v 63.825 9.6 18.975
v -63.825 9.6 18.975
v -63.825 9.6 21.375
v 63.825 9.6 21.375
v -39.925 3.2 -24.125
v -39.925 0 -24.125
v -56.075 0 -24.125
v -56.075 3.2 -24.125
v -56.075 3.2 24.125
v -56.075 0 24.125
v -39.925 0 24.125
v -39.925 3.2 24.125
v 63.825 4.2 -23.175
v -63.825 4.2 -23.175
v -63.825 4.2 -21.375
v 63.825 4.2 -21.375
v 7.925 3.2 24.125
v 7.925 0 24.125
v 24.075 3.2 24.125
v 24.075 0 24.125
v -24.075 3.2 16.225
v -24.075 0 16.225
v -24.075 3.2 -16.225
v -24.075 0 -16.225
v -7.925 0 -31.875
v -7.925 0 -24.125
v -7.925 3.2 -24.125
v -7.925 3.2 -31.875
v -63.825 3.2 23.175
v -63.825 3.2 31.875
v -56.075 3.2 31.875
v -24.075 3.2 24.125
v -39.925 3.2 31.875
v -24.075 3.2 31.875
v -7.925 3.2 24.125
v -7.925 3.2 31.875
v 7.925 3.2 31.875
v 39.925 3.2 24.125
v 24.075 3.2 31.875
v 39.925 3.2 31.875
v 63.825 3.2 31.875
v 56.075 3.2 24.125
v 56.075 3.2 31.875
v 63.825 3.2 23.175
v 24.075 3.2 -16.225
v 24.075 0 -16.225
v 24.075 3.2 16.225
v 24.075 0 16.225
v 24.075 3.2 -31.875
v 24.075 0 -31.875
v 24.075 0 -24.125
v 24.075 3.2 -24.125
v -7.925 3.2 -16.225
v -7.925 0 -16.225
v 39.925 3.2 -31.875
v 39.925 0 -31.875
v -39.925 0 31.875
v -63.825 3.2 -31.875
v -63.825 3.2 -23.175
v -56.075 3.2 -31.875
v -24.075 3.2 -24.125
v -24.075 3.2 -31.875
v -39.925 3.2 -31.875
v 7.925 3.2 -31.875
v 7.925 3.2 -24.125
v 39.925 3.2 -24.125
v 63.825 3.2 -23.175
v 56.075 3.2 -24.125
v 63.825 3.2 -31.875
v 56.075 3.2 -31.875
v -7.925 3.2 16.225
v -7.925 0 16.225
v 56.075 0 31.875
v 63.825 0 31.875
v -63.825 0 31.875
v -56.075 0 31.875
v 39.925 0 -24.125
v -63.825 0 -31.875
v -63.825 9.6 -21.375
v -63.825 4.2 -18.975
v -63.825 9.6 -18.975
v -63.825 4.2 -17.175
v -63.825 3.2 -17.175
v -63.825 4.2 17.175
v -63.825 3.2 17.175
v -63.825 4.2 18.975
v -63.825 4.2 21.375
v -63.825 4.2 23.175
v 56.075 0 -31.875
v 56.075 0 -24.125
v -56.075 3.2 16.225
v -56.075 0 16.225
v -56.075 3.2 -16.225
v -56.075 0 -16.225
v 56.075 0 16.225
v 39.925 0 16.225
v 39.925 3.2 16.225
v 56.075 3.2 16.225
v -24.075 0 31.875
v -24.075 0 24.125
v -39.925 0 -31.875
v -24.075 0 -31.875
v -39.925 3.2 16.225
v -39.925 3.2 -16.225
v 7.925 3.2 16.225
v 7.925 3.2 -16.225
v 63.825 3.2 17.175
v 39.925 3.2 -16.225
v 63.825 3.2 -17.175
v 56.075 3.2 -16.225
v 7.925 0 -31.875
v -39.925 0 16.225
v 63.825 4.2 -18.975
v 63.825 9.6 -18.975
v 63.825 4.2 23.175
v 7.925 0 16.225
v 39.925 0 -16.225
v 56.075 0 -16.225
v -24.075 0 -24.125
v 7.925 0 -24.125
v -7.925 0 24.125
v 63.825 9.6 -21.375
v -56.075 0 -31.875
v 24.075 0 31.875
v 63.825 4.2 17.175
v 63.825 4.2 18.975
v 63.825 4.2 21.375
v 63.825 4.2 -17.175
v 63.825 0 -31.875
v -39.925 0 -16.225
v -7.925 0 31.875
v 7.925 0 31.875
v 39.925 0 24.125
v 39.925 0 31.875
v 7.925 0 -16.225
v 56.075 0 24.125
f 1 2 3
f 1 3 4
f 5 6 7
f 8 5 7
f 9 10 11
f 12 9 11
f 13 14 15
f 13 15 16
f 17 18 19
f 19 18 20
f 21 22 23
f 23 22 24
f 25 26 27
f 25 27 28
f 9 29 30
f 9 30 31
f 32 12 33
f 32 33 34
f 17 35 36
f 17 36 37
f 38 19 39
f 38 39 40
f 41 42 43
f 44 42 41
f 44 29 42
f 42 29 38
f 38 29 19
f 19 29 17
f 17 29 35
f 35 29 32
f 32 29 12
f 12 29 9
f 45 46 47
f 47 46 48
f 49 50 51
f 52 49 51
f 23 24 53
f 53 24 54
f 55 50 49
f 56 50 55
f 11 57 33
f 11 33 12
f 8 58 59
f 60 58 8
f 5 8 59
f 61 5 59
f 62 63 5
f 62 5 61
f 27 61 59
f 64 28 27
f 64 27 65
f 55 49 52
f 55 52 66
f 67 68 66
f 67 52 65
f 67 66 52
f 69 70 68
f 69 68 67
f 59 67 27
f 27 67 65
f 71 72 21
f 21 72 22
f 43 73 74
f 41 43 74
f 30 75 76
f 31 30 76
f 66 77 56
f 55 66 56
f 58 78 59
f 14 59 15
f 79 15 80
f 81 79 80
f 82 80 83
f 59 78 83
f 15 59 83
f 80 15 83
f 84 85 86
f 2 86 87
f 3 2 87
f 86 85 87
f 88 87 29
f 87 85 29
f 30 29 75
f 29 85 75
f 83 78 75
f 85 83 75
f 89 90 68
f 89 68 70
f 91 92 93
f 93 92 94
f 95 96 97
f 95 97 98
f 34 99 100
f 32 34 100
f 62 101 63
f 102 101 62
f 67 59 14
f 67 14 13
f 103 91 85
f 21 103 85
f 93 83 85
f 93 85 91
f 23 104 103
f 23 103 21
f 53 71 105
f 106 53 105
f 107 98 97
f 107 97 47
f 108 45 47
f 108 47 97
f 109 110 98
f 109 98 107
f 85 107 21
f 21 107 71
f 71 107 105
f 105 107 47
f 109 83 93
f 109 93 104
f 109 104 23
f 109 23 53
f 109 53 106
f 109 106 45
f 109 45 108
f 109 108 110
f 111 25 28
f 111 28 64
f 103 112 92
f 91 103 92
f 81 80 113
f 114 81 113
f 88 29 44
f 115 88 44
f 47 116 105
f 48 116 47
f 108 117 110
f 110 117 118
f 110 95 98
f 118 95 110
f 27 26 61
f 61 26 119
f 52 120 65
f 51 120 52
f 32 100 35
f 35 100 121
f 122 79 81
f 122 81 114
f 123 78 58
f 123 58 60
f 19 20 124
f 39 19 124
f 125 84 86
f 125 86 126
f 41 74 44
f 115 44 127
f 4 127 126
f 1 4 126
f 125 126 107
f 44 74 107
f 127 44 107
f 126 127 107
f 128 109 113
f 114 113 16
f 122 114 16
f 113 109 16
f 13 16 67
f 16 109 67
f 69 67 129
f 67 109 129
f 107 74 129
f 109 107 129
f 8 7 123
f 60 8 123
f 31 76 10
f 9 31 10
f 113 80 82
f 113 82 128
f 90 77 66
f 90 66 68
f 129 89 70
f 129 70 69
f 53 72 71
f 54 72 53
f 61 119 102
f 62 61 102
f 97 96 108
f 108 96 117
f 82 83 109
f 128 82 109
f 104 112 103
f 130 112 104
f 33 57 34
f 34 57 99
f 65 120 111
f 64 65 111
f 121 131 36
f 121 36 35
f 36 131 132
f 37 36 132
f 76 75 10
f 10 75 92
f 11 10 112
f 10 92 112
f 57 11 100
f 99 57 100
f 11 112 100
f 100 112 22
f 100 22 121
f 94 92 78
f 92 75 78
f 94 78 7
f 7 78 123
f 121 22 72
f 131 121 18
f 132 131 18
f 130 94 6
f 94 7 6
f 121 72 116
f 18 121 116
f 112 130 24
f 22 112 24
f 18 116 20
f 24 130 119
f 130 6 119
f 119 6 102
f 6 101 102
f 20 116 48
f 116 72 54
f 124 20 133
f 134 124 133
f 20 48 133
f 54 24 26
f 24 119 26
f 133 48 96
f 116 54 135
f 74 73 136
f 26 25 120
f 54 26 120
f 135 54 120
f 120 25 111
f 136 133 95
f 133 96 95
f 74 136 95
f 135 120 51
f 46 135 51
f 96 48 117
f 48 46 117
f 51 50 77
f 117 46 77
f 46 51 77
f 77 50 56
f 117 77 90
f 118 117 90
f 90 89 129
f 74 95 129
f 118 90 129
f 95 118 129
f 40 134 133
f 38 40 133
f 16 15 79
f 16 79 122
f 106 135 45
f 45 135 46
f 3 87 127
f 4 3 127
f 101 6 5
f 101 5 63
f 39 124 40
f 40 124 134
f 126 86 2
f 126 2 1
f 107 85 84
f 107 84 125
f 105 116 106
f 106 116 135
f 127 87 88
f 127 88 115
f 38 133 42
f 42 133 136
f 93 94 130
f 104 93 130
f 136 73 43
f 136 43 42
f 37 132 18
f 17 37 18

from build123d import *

# Parameters (mm, degrees)
SKETCH1_W           = 7.75
SKETCH1_H           = 32.45
SKETCH1_H_2         = 7.9
SKETCH1_H_3         = 7.75
SKETCH1_W_2         = 16.15
SKETCH1_W_3         = 15.85
BOSS_EXTRUDE1_DEPTH = 3.2
SKETCH2_W           = 127.65
SKETCH2_H           = 6
BOSS_EXTRUDE2_DEPTH = 1
SKETCH3_W           = 127.65
SKETCH3_H           = 2.4
BOSS_EXTRUDE3_DEPTH = 5.4


with BuildPart() as part:
    # Sketch1 → Boss-Extrude1 (new body)
    with BuildSketch(Plane(origin=(0, 0, 0), x_dir=(1, 0, 0), z_dir=(0, 1, 0))):
        with Locations((-59.95, 0)):
            Rectangle(SKETCH1_W, SKETCH1_H)
        with Locations((-59.95, 20.175)):
            Rectangle(SKETCH1_W, SKETCH1_H_2)
        with Locations((-59.95, 28)):
            Rectangle(SKETCH1_W, SKETCH1_H_3)
        with Locations((-59.95, -20.175)):
            Rectangle(SKETCH1_W, SKETCH1_H_2)
        with Locations((-59.95, -28)):
            Rectangle(SKETCH1_W, SKETCH1_H_3)
        with Locations((-48, 20.175)):
            Rectangle(SKETCH1_W_2, SKETCH1_H_2)
        with Locations((-48, -20.175)):
            Rectangle(SKETCH1_W_2, SKETCH1_H_2)
        with Locations((-32, -28)):
            Rectangle(SKETCH1_W_3, SKETCH1_H_3)
        with Locations((-32, -20.175)):
            Rectangle(SKETCH1_W_3, SKETCH1_H_2)
        with Locations((-32, 0)):
            Rectangle(SKETCH1_W_3, SKETCH1_H)
        with Locations((-32, 20.175)):
            Rectangle(SKETCH1_W_3, SKETCH1_H_2)
        with Locations((-32, 28)):
            Rectangle(SKETCH1_W_3, SKETCH1_H_3)
        with Locations((-16, 20.175)):
            Rectangle(SKETCH1_W_2, SKETCH1_H_2)
        with Locations((-16, -20.175)):
            Rectangle(SKETCH1_W_2, SKETCH1_H_2)
        with Locations((0, -20.175)):
            Rectangle(SKETCH1_W_3, SKETCH1_H_2)
        with Locations((0, -28)):
            Rectangle(SKETCH1_W_3, SKETCH1_H_3)
        with Locations((0, 20.175)):
            Rectangle(SKETCH1_W_3, SKETCH1_H_2)
        Rectangle(SKETCH1_W_3, SKETCH1_H)
        with Locations((0, 28)):
            Rectangle(SKETCH1_W_3, SKETCH1_H_3)
        with Locations((32, 28)):
            Rectangle(SKETCH1_W_3, SKETCH1_H_3)
        with Locations((32, 20.175)):
            Rectangle(SKETCH1_W_3, SKETCH1_H_2)
        with Locations((32, 0)):
            Rectangle(SKETCH1_W_3, SKETCH1_H)
        with Locations((32, -20.175)):
            Rectangle(SKETCH1_W_3, SKETCH1_H_2)
        with Locations((32, -28)):
            Rectangle(SKETCH1_W_3, SKETCH1_H_3)
        with Locations((16, 20.175)):
            Rectangle(SKETCH1_W_2, SKETCH1_H_2)
        with Locations((16, -20.175)):
            Rectangle(SKETCH1_W_2, SKETCH1_H_2)
        with Locations((48, -20.175)):
            Rectangle(SKETCH1_W_2, SKETCH1_H_2)
        with Locations((48, 20.175)):
            Rectangle(SKETCH1_W_2, SKETCH1_H_2)
        with Locations((59.95, 28)):
            Rectangle(SKETCH1_W, SKETCH1_H_3)
        with Locations((59.95, 20.175)):
            Rectangle(SKETCH1_W, SKETCH1_H_2)
        with Locations((59.95, 0)):
            Rectangle(SKETCH1_W, SKETCH1_H)
        with Locations((59.95, -20.175)):
            Rectangle(SKETCH1_W, SKETCH1_H_2)
        with Locations((59.95, -28)):
            Rectangle(SKETCH1_W, SKETCH1_H_3)
    extrude(amount=BOSS_EXTRUDE1_DEPTH)

    # Sketch2 → Boss-Extrude2 (add)
    with BuildSketch(Plane(origin=(0, 3.2, 0), x_dir=(1, 0, 0), z_dir=(0, 1, 0))):
        with Locations((0, -20.175)):
            Rectangle(SKETCH2_W, SKETCH2_H)
        with Locations((0, 20.175)):
            Rectangle(SKETCH2_W, SKETCH2_H)
    extrude(amount=BOSS_EXTRUDE2_DEPTH)

    # Sketch3 → Boss-Extrude3 (add)
    with BuildSketch(Plane(origin=(0, 4.2, 0), x_dir=(1, 0, 0), z_dir=(0, 1, 0))):
        with Locations((0, 20.175)):
            Rectangle(SKETCH3_W, SKETCH3_H)
        with Locations((0, -20.175)):
            Rectangle(SKETCH3_W, SKETCH3_H)
    extrude(amount=BOSS_EXTRUDE3_DEPTH)


solid = part.part
